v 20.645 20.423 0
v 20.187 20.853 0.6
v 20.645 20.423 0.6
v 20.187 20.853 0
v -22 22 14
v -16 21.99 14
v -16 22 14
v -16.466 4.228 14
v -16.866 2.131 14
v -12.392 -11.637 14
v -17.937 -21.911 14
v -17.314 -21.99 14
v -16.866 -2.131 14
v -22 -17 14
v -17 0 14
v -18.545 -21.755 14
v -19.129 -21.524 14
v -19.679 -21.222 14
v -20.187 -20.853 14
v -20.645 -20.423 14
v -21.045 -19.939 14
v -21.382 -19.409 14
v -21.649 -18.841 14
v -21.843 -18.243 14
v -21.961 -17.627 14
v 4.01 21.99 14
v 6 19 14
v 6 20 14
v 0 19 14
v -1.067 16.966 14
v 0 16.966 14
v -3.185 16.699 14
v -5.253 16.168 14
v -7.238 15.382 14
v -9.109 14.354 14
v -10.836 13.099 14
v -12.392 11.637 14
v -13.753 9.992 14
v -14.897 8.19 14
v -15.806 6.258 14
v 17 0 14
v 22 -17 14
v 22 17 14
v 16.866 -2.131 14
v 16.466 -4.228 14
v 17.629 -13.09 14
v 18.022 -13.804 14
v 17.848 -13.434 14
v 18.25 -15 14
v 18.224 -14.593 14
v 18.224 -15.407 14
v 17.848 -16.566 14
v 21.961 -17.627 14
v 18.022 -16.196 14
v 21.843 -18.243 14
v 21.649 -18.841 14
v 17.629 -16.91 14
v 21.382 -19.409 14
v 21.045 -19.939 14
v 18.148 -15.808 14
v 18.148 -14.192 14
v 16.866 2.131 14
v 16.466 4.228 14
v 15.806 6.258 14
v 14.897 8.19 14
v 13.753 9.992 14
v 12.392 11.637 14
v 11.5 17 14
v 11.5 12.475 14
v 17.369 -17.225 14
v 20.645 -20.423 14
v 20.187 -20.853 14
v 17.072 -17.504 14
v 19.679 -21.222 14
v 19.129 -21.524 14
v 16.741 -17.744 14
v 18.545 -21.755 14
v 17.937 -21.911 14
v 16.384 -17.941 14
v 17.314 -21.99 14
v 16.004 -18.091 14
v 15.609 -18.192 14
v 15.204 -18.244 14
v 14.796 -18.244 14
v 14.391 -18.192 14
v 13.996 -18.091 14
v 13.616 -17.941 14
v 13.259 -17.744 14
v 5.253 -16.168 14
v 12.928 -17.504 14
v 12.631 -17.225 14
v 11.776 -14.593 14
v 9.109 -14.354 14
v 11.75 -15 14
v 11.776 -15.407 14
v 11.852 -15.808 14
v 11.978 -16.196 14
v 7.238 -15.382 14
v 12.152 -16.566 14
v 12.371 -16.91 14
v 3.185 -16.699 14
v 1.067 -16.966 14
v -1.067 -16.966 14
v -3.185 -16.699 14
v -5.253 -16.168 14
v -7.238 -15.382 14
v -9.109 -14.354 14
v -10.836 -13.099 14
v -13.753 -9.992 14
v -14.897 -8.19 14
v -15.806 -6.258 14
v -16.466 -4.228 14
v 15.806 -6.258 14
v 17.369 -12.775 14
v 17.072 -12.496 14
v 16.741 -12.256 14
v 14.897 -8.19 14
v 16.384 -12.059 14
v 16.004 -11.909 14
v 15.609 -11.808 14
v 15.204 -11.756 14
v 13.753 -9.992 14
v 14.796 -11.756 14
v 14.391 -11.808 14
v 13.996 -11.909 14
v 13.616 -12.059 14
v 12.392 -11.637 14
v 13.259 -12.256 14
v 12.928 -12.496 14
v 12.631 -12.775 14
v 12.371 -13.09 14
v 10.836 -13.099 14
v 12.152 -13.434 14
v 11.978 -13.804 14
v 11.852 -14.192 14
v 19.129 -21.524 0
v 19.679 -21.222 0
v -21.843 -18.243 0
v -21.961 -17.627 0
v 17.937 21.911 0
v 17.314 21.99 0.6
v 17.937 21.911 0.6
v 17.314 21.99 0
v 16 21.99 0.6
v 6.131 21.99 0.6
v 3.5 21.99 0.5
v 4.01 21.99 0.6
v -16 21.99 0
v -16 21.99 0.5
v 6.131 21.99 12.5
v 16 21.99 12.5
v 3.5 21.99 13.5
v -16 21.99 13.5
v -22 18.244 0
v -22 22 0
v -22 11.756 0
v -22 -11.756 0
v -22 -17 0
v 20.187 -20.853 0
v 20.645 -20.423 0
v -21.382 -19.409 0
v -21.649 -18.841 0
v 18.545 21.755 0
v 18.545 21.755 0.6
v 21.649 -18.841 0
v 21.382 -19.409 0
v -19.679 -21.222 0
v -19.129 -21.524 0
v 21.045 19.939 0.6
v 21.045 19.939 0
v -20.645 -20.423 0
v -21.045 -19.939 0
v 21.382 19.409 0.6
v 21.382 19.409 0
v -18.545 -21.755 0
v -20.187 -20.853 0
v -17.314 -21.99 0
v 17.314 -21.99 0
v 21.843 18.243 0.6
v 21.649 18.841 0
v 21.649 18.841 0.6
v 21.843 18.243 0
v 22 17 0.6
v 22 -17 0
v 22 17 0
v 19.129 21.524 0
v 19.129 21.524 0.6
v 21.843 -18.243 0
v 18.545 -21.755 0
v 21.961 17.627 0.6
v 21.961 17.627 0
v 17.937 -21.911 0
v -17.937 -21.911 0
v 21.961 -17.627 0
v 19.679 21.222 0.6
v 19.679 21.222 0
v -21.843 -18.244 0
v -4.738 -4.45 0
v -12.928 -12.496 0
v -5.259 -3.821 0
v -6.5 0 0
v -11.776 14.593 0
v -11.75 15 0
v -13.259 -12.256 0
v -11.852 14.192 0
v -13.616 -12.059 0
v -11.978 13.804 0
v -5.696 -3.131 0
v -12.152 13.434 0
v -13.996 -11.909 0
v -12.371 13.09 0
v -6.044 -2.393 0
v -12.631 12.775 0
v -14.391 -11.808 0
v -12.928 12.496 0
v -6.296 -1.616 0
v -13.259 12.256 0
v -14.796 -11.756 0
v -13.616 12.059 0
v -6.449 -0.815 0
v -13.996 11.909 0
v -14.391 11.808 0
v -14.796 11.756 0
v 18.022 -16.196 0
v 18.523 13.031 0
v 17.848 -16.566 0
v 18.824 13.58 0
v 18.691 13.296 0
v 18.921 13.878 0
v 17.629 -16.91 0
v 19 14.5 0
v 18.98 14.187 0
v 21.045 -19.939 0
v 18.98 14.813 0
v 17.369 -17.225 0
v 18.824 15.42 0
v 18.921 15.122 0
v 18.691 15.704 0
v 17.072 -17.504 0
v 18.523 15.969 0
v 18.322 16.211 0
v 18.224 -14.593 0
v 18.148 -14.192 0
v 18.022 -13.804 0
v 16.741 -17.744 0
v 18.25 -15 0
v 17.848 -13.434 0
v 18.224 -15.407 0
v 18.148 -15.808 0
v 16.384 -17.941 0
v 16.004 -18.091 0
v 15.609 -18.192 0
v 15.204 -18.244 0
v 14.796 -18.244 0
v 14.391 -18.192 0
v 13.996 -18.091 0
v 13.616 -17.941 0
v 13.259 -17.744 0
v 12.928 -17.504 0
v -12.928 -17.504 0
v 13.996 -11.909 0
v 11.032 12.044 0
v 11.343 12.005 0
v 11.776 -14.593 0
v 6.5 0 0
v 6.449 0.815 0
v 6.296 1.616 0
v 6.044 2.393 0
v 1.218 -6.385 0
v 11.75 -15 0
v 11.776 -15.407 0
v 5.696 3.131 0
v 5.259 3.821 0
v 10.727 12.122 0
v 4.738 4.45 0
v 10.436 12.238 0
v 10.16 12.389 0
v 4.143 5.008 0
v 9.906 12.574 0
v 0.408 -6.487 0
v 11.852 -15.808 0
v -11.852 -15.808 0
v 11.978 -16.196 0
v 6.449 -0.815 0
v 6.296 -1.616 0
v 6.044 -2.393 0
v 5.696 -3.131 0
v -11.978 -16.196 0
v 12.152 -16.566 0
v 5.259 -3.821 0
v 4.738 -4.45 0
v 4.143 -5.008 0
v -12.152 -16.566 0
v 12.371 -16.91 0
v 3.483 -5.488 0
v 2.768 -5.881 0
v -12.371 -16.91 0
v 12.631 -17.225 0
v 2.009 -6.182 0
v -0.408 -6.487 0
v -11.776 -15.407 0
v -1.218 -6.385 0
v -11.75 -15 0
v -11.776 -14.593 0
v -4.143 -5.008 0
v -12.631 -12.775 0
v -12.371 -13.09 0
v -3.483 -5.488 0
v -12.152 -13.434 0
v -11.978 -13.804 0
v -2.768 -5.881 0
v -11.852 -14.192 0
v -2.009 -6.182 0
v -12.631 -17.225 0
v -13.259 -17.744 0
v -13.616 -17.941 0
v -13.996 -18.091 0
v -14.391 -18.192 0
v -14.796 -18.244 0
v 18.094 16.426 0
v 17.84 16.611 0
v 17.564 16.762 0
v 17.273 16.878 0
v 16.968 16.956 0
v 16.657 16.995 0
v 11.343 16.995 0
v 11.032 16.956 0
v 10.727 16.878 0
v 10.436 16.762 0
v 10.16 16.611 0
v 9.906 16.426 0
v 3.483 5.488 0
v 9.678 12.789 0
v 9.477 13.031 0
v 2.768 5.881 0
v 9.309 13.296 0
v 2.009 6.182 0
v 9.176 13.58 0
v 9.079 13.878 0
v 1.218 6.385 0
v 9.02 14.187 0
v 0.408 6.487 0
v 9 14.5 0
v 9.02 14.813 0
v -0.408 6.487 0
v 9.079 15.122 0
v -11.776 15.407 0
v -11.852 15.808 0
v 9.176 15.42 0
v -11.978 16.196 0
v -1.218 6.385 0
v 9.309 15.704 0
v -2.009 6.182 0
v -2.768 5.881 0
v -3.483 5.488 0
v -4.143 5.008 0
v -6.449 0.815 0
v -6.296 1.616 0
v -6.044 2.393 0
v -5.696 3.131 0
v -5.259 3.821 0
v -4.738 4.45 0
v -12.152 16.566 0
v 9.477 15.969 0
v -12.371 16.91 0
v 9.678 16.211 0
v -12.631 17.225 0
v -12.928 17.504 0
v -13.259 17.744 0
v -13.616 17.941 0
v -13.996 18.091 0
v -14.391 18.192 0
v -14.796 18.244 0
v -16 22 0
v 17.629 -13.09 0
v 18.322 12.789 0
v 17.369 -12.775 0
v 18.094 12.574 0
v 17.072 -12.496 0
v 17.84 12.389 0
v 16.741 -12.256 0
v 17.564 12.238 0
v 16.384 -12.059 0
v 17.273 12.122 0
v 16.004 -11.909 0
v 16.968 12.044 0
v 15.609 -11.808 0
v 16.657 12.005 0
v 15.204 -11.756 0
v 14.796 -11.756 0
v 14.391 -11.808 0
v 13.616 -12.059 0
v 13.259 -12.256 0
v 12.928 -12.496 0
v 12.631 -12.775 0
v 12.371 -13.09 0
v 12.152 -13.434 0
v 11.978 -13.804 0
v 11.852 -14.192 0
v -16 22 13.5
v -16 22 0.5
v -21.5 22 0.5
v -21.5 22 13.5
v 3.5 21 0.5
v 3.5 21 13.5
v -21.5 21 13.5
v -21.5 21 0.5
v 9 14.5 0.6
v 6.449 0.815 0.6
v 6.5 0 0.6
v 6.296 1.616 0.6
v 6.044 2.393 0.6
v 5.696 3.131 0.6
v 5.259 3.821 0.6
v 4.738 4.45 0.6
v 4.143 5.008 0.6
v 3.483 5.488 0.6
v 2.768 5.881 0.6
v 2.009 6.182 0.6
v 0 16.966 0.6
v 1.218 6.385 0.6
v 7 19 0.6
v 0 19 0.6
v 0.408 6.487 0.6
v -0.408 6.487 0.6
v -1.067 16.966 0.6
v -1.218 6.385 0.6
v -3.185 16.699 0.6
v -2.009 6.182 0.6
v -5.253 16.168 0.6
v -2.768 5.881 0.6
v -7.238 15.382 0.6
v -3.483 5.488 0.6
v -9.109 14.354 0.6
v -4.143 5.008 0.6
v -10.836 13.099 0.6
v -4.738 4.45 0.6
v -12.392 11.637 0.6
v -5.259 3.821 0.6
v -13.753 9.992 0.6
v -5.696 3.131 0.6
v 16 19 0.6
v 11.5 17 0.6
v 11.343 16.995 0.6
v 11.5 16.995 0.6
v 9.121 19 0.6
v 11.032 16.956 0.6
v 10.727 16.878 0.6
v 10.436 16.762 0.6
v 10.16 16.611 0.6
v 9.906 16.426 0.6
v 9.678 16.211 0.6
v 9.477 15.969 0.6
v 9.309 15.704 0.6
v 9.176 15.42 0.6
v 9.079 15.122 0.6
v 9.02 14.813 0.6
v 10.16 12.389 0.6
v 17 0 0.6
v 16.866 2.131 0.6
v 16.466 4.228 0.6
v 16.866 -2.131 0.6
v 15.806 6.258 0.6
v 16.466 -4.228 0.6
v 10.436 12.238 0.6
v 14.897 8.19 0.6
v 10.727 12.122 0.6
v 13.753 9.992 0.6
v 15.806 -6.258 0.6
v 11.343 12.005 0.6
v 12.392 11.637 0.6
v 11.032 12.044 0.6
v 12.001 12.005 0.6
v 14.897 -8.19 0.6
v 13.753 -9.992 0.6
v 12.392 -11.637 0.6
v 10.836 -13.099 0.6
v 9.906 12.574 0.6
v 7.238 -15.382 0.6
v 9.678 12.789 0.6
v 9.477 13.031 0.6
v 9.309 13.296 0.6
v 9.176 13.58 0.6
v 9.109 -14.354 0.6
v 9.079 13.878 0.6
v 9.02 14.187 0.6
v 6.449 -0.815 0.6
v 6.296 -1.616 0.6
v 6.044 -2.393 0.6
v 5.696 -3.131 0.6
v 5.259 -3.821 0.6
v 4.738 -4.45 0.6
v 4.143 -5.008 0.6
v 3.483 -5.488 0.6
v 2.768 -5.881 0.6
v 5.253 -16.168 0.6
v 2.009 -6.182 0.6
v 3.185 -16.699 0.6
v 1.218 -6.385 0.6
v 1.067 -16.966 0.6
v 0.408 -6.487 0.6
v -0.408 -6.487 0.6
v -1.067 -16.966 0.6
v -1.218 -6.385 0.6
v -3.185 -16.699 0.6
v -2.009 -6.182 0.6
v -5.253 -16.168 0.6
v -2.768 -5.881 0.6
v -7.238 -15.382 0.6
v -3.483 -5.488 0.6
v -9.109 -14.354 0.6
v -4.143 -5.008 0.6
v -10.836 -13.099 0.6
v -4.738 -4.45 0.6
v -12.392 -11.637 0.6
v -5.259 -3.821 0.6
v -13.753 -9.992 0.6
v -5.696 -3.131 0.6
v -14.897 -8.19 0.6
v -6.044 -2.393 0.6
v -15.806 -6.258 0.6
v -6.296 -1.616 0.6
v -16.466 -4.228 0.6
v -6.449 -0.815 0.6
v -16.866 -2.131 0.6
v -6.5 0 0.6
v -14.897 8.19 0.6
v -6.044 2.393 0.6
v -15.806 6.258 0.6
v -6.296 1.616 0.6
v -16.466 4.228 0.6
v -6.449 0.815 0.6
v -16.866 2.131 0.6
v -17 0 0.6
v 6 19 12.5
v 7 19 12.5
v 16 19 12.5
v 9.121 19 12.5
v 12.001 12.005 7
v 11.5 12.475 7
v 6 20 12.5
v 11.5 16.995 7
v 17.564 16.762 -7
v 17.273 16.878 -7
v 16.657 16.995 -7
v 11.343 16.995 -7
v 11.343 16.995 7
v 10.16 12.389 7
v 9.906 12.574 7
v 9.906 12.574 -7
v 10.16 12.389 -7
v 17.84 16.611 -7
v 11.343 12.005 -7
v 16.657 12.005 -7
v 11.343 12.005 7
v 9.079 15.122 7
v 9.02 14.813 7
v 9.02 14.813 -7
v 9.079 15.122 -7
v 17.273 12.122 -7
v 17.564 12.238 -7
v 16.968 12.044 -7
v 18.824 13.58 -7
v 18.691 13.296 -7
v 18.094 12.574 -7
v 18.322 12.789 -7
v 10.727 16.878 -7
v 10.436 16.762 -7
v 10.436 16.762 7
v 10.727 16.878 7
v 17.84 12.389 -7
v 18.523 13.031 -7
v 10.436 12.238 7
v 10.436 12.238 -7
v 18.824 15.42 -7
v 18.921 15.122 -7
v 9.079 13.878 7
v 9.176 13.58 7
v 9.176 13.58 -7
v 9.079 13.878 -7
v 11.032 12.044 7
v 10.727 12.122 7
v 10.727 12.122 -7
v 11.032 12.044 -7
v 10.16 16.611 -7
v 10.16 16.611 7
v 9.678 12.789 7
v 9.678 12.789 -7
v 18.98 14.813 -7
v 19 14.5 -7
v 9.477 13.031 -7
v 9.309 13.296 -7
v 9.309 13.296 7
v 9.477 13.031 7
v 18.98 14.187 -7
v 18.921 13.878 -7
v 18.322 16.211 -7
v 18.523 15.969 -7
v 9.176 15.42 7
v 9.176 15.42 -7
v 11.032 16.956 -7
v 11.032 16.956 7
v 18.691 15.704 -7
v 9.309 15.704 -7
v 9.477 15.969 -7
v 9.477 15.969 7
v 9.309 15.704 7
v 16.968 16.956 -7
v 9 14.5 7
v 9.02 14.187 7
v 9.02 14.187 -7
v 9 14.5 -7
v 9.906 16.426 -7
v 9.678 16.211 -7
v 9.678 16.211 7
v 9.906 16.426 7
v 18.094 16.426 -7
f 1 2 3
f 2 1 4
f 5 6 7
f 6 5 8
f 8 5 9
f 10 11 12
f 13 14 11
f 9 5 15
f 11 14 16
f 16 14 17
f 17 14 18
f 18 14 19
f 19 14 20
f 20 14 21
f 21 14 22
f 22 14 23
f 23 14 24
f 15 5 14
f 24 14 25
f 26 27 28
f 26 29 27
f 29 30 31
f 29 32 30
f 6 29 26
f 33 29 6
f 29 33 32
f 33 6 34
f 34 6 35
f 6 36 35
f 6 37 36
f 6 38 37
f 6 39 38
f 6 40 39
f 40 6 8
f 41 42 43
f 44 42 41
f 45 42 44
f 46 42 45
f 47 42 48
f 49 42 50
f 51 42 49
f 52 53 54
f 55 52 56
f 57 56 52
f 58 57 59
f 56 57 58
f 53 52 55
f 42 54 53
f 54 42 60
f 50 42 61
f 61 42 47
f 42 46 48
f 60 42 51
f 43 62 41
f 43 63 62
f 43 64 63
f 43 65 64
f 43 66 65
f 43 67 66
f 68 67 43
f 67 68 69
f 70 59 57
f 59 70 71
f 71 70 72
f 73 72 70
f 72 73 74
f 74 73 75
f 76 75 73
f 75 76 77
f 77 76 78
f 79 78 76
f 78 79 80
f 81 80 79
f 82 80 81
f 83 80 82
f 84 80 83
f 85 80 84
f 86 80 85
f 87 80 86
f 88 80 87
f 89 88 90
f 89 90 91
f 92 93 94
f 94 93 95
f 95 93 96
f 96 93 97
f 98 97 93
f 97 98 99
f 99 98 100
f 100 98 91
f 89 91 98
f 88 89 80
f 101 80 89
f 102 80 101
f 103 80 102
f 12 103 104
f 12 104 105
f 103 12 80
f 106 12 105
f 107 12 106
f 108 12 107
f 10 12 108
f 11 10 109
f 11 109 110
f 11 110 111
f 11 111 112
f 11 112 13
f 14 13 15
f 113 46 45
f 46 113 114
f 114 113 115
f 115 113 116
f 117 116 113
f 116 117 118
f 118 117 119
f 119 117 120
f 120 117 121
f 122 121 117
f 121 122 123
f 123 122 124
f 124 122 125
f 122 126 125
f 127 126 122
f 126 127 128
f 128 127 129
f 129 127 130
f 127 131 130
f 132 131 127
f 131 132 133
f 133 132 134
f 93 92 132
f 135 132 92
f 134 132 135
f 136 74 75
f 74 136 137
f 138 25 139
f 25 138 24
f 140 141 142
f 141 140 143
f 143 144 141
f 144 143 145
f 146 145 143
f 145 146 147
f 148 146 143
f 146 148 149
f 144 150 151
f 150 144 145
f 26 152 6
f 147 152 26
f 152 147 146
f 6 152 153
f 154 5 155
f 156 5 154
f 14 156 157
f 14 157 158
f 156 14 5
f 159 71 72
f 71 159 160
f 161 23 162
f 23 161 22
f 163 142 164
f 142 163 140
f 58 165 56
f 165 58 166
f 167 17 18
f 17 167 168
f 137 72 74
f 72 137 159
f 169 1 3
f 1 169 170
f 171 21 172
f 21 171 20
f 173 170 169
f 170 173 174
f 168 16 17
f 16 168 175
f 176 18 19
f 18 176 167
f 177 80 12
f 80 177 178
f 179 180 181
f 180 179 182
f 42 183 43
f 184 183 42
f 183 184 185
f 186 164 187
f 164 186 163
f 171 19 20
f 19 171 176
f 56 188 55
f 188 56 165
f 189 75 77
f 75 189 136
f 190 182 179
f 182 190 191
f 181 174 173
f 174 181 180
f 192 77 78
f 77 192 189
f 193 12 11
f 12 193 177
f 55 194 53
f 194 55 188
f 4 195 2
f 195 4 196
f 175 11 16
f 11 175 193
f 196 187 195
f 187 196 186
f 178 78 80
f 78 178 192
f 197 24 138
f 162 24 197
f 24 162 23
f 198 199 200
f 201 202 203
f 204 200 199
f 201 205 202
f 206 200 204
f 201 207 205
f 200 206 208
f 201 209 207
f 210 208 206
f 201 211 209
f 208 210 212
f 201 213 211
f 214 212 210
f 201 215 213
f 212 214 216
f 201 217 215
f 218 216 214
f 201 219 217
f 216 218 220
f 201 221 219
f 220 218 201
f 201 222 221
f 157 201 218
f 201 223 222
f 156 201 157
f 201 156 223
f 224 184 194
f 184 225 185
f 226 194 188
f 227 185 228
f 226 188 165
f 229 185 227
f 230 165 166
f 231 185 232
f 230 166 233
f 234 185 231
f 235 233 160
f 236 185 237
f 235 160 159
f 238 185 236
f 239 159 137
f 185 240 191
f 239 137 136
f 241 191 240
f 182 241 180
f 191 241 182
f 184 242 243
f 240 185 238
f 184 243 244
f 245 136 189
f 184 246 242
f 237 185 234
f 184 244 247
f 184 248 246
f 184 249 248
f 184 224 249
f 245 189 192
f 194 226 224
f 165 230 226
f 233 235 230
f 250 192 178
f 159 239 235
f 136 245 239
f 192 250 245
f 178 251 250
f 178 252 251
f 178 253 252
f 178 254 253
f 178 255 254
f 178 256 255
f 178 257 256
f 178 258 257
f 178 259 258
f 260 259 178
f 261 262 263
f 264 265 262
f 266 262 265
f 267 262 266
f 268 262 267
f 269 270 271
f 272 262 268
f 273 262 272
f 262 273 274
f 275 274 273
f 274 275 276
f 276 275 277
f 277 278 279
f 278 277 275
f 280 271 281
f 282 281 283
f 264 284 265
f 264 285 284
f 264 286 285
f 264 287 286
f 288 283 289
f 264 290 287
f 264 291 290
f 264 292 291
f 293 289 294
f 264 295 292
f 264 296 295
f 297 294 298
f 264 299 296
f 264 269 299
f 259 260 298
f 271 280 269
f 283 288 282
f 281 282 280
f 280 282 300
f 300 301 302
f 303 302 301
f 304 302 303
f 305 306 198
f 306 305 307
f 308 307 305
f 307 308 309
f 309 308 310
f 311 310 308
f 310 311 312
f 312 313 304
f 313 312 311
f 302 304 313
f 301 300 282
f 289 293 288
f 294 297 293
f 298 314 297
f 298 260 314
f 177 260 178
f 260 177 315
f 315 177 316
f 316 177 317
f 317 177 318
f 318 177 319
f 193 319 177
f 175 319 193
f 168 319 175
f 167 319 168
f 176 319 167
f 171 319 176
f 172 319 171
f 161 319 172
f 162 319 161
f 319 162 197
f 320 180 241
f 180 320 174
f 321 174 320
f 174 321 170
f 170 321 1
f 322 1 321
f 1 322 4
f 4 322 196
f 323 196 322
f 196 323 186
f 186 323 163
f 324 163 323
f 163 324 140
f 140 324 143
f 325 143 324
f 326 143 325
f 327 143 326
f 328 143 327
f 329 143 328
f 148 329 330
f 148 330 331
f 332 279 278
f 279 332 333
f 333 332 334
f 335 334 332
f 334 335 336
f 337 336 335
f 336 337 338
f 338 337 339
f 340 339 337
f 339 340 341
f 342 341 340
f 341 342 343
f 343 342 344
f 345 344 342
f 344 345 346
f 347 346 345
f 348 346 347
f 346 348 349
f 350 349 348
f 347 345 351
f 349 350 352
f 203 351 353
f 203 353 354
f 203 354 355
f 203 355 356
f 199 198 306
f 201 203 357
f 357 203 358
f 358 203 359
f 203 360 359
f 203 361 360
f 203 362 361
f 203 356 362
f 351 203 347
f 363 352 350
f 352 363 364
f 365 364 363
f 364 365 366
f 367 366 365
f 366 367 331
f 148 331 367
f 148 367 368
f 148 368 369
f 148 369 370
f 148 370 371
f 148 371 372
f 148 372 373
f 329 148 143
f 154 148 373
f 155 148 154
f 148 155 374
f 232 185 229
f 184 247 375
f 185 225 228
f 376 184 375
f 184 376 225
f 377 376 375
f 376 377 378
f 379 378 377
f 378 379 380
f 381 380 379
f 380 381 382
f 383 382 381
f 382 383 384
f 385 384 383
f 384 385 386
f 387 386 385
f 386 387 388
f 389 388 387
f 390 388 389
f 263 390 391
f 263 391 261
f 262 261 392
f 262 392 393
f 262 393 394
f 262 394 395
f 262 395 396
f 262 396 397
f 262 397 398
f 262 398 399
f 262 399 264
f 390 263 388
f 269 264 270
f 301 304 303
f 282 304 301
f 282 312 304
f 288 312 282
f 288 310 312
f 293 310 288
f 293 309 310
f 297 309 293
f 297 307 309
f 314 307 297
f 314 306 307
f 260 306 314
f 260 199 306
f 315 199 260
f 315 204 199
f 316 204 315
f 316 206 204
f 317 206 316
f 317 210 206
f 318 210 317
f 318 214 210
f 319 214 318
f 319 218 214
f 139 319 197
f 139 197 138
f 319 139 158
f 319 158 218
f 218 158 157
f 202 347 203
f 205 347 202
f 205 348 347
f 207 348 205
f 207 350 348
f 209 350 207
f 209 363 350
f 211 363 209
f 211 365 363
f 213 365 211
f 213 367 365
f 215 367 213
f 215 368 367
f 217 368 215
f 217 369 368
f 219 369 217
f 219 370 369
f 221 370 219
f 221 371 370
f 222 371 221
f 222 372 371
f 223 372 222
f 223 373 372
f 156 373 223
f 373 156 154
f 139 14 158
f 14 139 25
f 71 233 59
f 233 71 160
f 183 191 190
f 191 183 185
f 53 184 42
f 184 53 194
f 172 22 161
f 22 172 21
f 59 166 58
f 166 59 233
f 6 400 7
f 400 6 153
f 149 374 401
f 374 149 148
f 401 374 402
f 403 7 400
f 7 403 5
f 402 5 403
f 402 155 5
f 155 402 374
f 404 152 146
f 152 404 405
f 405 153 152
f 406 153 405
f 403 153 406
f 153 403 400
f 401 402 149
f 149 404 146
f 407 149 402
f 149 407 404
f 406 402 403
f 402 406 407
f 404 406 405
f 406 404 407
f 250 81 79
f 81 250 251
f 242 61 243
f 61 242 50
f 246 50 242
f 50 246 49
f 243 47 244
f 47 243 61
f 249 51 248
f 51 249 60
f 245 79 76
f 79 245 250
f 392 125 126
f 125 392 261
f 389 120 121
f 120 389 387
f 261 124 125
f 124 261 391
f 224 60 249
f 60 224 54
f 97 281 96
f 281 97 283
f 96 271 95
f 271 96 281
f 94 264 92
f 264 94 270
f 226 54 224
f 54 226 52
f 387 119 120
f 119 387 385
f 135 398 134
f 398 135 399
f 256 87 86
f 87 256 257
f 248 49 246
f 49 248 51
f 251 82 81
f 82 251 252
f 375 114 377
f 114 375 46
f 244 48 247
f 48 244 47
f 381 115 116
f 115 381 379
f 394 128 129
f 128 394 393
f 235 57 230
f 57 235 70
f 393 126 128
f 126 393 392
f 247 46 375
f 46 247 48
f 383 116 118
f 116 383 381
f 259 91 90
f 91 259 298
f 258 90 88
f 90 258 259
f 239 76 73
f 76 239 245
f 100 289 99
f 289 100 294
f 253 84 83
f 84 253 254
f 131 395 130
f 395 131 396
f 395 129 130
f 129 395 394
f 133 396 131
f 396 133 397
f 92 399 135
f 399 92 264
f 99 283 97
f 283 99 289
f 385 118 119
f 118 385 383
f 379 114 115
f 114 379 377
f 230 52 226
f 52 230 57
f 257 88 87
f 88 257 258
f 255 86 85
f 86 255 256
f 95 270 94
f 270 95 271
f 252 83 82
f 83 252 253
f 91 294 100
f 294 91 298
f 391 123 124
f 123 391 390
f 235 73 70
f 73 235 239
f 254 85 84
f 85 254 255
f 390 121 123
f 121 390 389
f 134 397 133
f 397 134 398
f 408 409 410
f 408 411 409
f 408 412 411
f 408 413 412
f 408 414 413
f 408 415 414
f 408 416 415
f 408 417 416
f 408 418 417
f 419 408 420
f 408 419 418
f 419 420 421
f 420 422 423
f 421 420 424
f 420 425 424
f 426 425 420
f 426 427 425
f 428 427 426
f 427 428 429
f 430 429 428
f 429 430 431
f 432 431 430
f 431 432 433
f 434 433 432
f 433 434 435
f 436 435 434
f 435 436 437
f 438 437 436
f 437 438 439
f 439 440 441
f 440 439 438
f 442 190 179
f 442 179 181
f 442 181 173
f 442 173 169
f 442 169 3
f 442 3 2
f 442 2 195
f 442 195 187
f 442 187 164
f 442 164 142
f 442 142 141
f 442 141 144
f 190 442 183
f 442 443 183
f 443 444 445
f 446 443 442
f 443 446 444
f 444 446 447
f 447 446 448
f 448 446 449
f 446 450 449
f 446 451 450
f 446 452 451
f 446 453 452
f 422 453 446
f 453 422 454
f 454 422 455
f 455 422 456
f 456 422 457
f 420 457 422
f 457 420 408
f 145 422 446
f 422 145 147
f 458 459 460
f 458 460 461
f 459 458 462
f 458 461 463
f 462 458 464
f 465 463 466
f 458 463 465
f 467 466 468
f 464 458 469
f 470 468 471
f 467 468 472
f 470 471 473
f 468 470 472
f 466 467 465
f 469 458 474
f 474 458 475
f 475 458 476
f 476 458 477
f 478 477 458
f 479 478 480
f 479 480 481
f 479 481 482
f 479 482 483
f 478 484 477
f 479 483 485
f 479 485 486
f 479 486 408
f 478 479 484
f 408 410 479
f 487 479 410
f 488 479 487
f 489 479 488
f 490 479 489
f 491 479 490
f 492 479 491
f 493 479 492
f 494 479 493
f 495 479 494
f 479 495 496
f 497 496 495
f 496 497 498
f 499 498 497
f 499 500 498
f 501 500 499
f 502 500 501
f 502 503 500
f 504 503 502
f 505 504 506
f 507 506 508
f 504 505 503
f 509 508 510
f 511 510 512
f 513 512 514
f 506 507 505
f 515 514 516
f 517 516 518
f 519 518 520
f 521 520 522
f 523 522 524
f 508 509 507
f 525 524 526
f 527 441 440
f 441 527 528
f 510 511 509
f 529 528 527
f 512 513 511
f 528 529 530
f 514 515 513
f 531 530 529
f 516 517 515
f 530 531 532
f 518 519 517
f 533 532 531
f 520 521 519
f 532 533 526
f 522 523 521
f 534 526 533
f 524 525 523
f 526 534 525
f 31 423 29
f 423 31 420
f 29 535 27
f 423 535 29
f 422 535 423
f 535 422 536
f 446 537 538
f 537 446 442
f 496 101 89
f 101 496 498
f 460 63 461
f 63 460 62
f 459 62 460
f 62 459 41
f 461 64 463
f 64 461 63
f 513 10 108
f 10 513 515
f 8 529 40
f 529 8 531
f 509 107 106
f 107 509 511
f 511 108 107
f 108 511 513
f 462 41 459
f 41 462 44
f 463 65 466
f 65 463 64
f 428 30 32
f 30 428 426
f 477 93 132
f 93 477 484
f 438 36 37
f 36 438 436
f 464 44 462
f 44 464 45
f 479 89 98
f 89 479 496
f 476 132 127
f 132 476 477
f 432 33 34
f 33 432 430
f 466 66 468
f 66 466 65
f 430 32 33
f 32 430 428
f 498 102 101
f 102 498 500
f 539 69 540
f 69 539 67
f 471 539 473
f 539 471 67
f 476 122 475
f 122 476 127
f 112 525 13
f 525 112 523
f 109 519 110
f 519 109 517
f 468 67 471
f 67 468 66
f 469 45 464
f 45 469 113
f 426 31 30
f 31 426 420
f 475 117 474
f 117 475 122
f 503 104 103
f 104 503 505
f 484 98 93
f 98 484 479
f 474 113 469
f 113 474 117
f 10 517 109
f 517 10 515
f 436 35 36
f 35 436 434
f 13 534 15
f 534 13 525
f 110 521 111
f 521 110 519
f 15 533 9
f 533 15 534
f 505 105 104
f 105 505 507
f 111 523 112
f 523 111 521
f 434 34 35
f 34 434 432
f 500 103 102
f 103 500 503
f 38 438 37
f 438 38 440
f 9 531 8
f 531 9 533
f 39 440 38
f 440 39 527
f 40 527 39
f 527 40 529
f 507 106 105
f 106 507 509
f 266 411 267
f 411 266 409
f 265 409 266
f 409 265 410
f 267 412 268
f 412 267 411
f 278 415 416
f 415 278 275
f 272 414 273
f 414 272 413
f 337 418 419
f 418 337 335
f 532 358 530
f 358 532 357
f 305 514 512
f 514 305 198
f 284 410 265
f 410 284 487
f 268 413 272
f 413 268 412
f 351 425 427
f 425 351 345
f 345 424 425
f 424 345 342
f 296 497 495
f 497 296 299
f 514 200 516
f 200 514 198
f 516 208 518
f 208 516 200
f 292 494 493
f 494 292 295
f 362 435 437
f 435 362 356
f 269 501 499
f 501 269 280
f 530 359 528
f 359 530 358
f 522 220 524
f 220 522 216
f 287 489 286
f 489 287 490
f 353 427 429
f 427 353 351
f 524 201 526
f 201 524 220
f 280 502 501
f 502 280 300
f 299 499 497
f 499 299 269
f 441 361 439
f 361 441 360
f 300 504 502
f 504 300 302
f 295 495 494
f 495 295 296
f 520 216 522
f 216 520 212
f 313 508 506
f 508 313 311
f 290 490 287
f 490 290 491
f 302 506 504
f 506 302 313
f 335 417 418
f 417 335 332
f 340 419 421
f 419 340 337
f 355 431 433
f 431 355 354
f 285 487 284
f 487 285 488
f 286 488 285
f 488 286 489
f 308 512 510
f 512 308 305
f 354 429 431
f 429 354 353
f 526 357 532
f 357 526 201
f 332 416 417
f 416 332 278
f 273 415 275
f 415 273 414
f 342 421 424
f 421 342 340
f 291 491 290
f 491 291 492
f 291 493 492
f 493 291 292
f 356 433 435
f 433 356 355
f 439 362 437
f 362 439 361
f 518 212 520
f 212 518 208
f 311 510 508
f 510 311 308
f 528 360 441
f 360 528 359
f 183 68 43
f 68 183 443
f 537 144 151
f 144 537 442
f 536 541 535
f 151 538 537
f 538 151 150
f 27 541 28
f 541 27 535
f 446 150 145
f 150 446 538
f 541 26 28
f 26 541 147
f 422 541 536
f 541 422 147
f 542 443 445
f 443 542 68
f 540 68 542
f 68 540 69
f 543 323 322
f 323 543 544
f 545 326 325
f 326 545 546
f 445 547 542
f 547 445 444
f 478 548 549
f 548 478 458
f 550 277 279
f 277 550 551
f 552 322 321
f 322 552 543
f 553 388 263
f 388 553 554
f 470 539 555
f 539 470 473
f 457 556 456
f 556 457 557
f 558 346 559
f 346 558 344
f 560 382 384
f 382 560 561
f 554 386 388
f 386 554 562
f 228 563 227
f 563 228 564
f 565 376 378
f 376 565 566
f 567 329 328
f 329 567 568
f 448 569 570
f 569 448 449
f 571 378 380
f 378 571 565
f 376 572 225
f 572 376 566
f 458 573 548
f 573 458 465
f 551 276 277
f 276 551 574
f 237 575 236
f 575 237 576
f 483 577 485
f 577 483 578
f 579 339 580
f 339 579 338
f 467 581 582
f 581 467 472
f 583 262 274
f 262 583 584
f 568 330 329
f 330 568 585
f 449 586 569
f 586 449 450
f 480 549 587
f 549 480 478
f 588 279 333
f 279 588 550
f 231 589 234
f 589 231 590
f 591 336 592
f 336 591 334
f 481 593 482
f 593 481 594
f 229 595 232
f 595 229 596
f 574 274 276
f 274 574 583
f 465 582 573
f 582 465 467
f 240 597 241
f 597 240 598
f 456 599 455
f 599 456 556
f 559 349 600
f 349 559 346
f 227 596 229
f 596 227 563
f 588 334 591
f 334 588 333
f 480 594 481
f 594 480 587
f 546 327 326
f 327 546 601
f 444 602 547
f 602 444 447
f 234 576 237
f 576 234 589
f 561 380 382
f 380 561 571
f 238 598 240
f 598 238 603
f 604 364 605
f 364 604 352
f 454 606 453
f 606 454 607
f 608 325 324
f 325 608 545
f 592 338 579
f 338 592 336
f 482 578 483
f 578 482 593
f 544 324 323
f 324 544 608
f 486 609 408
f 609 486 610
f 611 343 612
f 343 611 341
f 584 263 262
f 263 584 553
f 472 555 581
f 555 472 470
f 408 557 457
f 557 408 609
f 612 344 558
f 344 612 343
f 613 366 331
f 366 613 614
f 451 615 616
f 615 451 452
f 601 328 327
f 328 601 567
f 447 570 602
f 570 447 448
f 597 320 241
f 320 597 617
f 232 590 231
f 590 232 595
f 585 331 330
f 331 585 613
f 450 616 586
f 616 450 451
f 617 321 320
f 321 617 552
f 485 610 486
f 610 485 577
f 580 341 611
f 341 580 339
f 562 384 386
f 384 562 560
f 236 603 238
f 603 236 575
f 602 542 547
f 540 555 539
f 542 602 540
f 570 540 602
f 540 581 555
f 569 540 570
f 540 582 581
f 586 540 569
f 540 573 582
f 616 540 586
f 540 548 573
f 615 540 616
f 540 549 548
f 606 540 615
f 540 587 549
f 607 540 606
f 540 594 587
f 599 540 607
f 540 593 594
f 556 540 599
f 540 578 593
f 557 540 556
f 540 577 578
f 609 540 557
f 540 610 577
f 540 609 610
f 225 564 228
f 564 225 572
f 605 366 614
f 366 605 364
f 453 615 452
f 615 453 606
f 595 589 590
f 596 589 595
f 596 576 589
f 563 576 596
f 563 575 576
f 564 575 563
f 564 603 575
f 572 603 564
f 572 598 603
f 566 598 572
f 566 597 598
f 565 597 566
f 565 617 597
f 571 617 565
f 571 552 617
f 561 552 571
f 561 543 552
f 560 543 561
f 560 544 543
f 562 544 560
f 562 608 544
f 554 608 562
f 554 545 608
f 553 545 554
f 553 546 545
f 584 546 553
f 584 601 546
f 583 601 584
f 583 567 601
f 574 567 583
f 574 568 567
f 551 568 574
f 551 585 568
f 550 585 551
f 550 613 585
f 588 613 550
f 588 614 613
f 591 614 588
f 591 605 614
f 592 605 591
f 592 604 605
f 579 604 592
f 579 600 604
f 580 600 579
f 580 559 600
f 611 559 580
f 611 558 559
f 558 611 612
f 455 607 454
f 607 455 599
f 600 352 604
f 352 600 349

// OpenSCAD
$fn = 50;


union() {
	difference() {
		union() {
			hull() {
				translate(v = [-17.0000000000, 17.0000000000, 0]) {
					cylinder(h = 14, r = 5);
				}
				translate(v = [17.0000000000, 17.0000000000, 0]) {
					cylinder(h = 14, r = 5);
				}
				translate(v = [-17.0000000000, -17.0000000000, 0]) {
					cylinder(h = 14, r = 5);
				}
				translate(v = [17.0000000000, -17.0000000000, 0]) {
					cylinder(h = 14, r = 5);
				}
			}
			translate(v = [-22.0000000000, 16.0000000000, 0]) {
				cube(size = [6, 6, 14]);
			}
		}
		union() {
			translate(v = [-22.5000000000, -15.0000000000, -250.0000000000]) {
				rotate(a = [0, 0, 0]) {
					difference() {
						union() {
							hull() {
								translate(v = [7.5000000000, 0, 0]) {
									cylinder(h = 250, r = 3.2500000000, r1 = 3.2500000000, r2 = 3.2500000000);
								}
								translate(v = [-7.5000000000, 0, 0]) {
									cylinder(h = 250, r = 3.2500000000, r1 = 3.2500000000, r2 = 3.2500000000);
								}
							}
						}
						union();
					}
				}
			}
			translate(v = [-22.5000000000, 15.0000000000, -250.0000000000]) {
				rotate(a = [0, 0, 0]) {
					difference() {
						union() {
							hull() {
								translate(v = [7.5000000000, 0, 0]) {
									cylinder(h = 250, r = 3.2500000000, r1 = 3.2500000000, r2 = 3.2500000000);
								}
								translate(v = [-7.5000000000, 0, 0]) {
									cylinder(h = 250, r = 3.2500000000, r1 = 3.2500000000, r2 = 3.2500000000);
								}
							}
						}
						union();
					}
				}
			}
			translate(v = [-21.5000000000, 21.0000000000, 0.5000000000]) {
				cube(size = [25, 1, 13.0000000000]);
			}
			translate(v = [15.0000000000, -15.0000000000, 0]) {
				cylinder(h = 100, r = 3.2500000000);
			}
			translate(v = [0.0000000000, 11.0000000000, 0.6000000000]) {
				cube(size = [11, 8, 16.4000000000]);
			}
			translate(v = [0, 0, 0.6000000000]) {
				cylinder(h = 16.4000000000, r = 17.0000000000);
			}
			translate(v = [0, 0, -7.0000000000]) {
				cylinder(h = 14, r = 6.5000000000);
			}
			translate(v = [0.0000000000, 17.0000000000, 0.6000000000]) {
				cube(size = [22.0000000000, 2, 16.4000000000]);
			}
			translate(v = [16.0000000000, 17.0000000000, 0.6000000000]) {
				cube(size = [6, 5, 16.4000000000]);
			}
			translate(v = [6.0000000000, 17.0000000000, 12.5000000000]) {
				cube(size = [16, 5, 1.5000000000]);
			}
			translate(v = [3.2500000000, 22.7500000000, 0.6000000000]) {
				rotate(a = [0, 0, -45]) {
					cube(size = [7.5000000000, 1.5000000000, 16.4000000000]);
				}
			}
			translate(v = [2.5000000000, 12.0000000000, 0.6000000000]) {
				cube(size = [9.0000000000, 5, 13.4000000000]);
			}
		}
	}
	union() {
		translate(v = [14, 14.5000000000, -7.0000000000]) {
			rotate(a = [0, 0, 0]) {
				difference() {
					union() {
						#hull() {
							#translate(v = [2.5000000000, 0, 0]) {
								cylinder(h = 14, r = 2.5000000000, r1 = 2.5000000000, r2 = 2.5000000000);
							}
							#translate(v = [-2.5000000000, 0, 0]) {
								cylinder(h = 14, r = 2.5000000000, r1 = 2.5000000000, r2 = 2.5000000000);
							}
						}
					}
					union();
				}
			}
		}
	}
}
